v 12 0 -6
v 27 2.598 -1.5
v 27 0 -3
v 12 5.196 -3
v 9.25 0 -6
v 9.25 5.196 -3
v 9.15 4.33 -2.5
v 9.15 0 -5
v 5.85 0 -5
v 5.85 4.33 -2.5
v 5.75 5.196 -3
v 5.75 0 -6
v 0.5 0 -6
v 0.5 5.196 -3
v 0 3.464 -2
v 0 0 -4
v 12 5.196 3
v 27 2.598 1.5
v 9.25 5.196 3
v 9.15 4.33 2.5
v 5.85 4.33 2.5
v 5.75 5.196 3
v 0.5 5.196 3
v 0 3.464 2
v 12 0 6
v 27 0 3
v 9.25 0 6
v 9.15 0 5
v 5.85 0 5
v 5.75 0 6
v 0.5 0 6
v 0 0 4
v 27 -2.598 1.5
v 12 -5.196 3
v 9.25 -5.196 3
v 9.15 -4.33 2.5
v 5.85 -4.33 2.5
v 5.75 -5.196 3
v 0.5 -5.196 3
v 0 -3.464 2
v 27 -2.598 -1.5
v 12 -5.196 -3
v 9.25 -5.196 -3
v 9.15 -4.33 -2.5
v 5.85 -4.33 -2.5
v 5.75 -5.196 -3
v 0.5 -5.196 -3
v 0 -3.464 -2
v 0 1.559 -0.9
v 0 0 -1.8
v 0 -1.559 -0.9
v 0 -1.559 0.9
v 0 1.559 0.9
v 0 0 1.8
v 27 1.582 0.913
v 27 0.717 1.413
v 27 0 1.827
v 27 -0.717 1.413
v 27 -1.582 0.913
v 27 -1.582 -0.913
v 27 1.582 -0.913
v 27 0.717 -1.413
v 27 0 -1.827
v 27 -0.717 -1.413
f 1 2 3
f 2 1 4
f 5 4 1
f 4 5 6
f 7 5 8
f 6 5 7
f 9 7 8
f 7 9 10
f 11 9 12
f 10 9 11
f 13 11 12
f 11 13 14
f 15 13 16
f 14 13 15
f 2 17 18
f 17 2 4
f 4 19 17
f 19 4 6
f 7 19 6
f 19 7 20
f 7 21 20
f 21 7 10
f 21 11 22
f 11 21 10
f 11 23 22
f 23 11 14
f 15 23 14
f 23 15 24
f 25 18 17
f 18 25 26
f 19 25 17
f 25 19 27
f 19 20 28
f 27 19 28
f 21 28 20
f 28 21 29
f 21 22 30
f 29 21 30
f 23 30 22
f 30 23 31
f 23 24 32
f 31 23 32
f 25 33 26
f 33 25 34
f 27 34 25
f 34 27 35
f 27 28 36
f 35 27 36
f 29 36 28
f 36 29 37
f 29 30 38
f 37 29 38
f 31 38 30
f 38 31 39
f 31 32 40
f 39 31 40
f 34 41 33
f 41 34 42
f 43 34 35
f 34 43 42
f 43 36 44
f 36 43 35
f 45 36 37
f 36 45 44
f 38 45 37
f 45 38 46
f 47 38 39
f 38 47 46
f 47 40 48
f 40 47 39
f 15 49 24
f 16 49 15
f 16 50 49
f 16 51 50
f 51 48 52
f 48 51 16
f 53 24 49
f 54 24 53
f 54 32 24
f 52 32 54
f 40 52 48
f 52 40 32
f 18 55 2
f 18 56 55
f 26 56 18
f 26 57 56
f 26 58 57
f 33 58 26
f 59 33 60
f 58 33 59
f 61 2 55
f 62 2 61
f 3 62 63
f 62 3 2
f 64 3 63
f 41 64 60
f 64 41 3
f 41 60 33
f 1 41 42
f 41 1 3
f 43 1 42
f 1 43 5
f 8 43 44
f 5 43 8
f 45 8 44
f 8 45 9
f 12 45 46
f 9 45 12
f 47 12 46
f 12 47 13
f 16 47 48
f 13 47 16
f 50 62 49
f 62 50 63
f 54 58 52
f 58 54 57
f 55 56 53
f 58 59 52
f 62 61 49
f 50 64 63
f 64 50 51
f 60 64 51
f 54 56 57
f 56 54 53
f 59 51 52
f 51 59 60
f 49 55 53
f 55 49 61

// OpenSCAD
// Lights5b
// Ferrules for 3 mm fiber optic sideglows

//p1=[ [0,0], [0,4], [0.5,5], [5.75,5], [5.85,4], [9.15,4], [9.25,5], [12,5], [27,3], [27,0] ];
p1=[ [0,0], [0,4], [0.5,6], [5.75,6], [5.85,5], [9.15,5], [9.25,6], [12,6], [27,3], [27,0] ];

module Ferrule1(){

difference(){
    rotate([0,-90,0])
    rotate_extrude($fn=6){
        rotate([0,0,-90])
        polygon(points=p1);
    }    
    
    color("cyan")
    rotate([0,90,0])
//    cylinder(r1=2.0,r2=1.8, h=50,$fn=6);
    cylinder(r1=1.8,r2=1.85, h=50,$fn=6);
}

}

//---------------------------------------------
// make a solid body version, ie no cut for the fiber
module Ferrule2(){

//difference(){
rotate([0,-90,0])
rotate_extrude($fn=6){
    rotate([0,0,-90])
    polygon(points=p1);
}    

}

//--------------------------------------------------------
// make a solid body version, scale the polygon, use this for making
// cuts into the Rx
module Ferrule3(){

rotate([0,-90,0])
rotate_extrude($fn=6){
    rotate([0,0,-90])
    scale(1.02)
    polygon(points=p1);
}    

}
//--------------------------------------------------------
// make a solid body version, scale the polygon, use this for making
// cuts into the lids only
module Ferrule4(){
/*
intersection(){
rotate([0,-90,0])
rotate_extrude($fn=6){
    rotate([0,0,-90])
    scale(1.02)
    polygon(points=p1);
}    
translate([8,-20,-10]) linear_extrude(height=20) square(40);
}
*/
translate([9,0,0])
color("green") rotate([0,90,0])
cylinder(r=6.1,h=8,$fn=6);

}

//============================


Ferrule1();


//translate([0,0,-13]) Ferrule4();

/*
color("cyan")
translate([-1,0,0])
rotate([0,90,0])
cylinder(r=1.5,h=40,$fn=30);

color("orange")
translate([0,0,13])
Ferrule2();

color("red")
translate([0,0,2*13])
Ferrule3();

color("pink")
intersection(){
    translate([0,0,3*13])
    difference(){
        Ferrule3();
        Ferrule2();
    }
    translate([-35,0,0])
    linear_extrude(heigth=100)
    square(100,center=true);
}

*/
